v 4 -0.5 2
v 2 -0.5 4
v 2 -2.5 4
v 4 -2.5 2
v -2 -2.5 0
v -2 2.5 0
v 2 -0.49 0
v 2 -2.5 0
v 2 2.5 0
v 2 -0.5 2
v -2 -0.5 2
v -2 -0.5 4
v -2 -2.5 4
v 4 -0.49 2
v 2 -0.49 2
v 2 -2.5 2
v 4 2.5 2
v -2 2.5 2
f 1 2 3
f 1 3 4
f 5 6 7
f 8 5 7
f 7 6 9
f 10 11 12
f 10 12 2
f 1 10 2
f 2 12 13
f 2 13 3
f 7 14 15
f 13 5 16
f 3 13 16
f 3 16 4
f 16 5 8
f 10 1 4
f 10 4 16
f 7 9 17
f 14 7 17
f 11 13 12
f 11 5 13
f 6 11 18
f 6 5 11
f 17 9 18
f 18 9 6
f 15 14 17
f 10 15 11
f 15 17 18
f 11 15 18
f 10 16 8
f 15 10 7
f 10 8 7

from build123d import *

# Parameters (mm, degrees)
SKETCH1_W           = 4
SKETCH1_H           = 5
BOSS_EXTRUDE1_DEPTH = 2
SKETCH2_W           = 4
SKETCH2_H           = 2
BOSS_EXTRUDE2_DEPTH = 2
BOSS_EXTRUDE3_DEPTH = 2
BOSS_EXTRUDE5_DEPTH = 2.99


with BuildPart() as part:
    # Sketch1 → Boss-Extrude1 (new body)
    with BuildSketch(Plane.XY):
        Rectangle(SKETCH1_W, SKETCH1_H)
    extrude(amount=BOSS_EXTRUDE1_DEPTH)

    # Sketch2 → Boss-Extrude2 (add)
    with BuildSketch(Plane.XY.offset(2)):
        with Locations((0, -1.5)):
            Rectangle(SKETCH2_W, SKETCH2_H)
    extrude(amount=BOSS_EXTRUDE2_DEPTH)

    # Sketch3 → Boss-Extrude3 (add)
    with BuildSketch(Plane(origin=(0, -0.5, 0), x_dir=(1, 0, 0), z_dir=(0, 1, 0))):
        Polygon((2, -4), (4, -2), (2, -2), align=None)
    extrude(amount=-BOSS_EXTRUDE3_DEPTH)

    # Sketch5 → Boss-Extrude5 (add)
    with BuildSketch(Plane(origin=(0, 2.5, 0), x_dir=(1, 0, 0), z_dir=(0, 1, 0))):
        Polygon((2, 0), (4, -2), (2, -2), align=None)
    extrude(amount=-BOSS_EXTRUDE5_DEPTH)


solid = part.part
